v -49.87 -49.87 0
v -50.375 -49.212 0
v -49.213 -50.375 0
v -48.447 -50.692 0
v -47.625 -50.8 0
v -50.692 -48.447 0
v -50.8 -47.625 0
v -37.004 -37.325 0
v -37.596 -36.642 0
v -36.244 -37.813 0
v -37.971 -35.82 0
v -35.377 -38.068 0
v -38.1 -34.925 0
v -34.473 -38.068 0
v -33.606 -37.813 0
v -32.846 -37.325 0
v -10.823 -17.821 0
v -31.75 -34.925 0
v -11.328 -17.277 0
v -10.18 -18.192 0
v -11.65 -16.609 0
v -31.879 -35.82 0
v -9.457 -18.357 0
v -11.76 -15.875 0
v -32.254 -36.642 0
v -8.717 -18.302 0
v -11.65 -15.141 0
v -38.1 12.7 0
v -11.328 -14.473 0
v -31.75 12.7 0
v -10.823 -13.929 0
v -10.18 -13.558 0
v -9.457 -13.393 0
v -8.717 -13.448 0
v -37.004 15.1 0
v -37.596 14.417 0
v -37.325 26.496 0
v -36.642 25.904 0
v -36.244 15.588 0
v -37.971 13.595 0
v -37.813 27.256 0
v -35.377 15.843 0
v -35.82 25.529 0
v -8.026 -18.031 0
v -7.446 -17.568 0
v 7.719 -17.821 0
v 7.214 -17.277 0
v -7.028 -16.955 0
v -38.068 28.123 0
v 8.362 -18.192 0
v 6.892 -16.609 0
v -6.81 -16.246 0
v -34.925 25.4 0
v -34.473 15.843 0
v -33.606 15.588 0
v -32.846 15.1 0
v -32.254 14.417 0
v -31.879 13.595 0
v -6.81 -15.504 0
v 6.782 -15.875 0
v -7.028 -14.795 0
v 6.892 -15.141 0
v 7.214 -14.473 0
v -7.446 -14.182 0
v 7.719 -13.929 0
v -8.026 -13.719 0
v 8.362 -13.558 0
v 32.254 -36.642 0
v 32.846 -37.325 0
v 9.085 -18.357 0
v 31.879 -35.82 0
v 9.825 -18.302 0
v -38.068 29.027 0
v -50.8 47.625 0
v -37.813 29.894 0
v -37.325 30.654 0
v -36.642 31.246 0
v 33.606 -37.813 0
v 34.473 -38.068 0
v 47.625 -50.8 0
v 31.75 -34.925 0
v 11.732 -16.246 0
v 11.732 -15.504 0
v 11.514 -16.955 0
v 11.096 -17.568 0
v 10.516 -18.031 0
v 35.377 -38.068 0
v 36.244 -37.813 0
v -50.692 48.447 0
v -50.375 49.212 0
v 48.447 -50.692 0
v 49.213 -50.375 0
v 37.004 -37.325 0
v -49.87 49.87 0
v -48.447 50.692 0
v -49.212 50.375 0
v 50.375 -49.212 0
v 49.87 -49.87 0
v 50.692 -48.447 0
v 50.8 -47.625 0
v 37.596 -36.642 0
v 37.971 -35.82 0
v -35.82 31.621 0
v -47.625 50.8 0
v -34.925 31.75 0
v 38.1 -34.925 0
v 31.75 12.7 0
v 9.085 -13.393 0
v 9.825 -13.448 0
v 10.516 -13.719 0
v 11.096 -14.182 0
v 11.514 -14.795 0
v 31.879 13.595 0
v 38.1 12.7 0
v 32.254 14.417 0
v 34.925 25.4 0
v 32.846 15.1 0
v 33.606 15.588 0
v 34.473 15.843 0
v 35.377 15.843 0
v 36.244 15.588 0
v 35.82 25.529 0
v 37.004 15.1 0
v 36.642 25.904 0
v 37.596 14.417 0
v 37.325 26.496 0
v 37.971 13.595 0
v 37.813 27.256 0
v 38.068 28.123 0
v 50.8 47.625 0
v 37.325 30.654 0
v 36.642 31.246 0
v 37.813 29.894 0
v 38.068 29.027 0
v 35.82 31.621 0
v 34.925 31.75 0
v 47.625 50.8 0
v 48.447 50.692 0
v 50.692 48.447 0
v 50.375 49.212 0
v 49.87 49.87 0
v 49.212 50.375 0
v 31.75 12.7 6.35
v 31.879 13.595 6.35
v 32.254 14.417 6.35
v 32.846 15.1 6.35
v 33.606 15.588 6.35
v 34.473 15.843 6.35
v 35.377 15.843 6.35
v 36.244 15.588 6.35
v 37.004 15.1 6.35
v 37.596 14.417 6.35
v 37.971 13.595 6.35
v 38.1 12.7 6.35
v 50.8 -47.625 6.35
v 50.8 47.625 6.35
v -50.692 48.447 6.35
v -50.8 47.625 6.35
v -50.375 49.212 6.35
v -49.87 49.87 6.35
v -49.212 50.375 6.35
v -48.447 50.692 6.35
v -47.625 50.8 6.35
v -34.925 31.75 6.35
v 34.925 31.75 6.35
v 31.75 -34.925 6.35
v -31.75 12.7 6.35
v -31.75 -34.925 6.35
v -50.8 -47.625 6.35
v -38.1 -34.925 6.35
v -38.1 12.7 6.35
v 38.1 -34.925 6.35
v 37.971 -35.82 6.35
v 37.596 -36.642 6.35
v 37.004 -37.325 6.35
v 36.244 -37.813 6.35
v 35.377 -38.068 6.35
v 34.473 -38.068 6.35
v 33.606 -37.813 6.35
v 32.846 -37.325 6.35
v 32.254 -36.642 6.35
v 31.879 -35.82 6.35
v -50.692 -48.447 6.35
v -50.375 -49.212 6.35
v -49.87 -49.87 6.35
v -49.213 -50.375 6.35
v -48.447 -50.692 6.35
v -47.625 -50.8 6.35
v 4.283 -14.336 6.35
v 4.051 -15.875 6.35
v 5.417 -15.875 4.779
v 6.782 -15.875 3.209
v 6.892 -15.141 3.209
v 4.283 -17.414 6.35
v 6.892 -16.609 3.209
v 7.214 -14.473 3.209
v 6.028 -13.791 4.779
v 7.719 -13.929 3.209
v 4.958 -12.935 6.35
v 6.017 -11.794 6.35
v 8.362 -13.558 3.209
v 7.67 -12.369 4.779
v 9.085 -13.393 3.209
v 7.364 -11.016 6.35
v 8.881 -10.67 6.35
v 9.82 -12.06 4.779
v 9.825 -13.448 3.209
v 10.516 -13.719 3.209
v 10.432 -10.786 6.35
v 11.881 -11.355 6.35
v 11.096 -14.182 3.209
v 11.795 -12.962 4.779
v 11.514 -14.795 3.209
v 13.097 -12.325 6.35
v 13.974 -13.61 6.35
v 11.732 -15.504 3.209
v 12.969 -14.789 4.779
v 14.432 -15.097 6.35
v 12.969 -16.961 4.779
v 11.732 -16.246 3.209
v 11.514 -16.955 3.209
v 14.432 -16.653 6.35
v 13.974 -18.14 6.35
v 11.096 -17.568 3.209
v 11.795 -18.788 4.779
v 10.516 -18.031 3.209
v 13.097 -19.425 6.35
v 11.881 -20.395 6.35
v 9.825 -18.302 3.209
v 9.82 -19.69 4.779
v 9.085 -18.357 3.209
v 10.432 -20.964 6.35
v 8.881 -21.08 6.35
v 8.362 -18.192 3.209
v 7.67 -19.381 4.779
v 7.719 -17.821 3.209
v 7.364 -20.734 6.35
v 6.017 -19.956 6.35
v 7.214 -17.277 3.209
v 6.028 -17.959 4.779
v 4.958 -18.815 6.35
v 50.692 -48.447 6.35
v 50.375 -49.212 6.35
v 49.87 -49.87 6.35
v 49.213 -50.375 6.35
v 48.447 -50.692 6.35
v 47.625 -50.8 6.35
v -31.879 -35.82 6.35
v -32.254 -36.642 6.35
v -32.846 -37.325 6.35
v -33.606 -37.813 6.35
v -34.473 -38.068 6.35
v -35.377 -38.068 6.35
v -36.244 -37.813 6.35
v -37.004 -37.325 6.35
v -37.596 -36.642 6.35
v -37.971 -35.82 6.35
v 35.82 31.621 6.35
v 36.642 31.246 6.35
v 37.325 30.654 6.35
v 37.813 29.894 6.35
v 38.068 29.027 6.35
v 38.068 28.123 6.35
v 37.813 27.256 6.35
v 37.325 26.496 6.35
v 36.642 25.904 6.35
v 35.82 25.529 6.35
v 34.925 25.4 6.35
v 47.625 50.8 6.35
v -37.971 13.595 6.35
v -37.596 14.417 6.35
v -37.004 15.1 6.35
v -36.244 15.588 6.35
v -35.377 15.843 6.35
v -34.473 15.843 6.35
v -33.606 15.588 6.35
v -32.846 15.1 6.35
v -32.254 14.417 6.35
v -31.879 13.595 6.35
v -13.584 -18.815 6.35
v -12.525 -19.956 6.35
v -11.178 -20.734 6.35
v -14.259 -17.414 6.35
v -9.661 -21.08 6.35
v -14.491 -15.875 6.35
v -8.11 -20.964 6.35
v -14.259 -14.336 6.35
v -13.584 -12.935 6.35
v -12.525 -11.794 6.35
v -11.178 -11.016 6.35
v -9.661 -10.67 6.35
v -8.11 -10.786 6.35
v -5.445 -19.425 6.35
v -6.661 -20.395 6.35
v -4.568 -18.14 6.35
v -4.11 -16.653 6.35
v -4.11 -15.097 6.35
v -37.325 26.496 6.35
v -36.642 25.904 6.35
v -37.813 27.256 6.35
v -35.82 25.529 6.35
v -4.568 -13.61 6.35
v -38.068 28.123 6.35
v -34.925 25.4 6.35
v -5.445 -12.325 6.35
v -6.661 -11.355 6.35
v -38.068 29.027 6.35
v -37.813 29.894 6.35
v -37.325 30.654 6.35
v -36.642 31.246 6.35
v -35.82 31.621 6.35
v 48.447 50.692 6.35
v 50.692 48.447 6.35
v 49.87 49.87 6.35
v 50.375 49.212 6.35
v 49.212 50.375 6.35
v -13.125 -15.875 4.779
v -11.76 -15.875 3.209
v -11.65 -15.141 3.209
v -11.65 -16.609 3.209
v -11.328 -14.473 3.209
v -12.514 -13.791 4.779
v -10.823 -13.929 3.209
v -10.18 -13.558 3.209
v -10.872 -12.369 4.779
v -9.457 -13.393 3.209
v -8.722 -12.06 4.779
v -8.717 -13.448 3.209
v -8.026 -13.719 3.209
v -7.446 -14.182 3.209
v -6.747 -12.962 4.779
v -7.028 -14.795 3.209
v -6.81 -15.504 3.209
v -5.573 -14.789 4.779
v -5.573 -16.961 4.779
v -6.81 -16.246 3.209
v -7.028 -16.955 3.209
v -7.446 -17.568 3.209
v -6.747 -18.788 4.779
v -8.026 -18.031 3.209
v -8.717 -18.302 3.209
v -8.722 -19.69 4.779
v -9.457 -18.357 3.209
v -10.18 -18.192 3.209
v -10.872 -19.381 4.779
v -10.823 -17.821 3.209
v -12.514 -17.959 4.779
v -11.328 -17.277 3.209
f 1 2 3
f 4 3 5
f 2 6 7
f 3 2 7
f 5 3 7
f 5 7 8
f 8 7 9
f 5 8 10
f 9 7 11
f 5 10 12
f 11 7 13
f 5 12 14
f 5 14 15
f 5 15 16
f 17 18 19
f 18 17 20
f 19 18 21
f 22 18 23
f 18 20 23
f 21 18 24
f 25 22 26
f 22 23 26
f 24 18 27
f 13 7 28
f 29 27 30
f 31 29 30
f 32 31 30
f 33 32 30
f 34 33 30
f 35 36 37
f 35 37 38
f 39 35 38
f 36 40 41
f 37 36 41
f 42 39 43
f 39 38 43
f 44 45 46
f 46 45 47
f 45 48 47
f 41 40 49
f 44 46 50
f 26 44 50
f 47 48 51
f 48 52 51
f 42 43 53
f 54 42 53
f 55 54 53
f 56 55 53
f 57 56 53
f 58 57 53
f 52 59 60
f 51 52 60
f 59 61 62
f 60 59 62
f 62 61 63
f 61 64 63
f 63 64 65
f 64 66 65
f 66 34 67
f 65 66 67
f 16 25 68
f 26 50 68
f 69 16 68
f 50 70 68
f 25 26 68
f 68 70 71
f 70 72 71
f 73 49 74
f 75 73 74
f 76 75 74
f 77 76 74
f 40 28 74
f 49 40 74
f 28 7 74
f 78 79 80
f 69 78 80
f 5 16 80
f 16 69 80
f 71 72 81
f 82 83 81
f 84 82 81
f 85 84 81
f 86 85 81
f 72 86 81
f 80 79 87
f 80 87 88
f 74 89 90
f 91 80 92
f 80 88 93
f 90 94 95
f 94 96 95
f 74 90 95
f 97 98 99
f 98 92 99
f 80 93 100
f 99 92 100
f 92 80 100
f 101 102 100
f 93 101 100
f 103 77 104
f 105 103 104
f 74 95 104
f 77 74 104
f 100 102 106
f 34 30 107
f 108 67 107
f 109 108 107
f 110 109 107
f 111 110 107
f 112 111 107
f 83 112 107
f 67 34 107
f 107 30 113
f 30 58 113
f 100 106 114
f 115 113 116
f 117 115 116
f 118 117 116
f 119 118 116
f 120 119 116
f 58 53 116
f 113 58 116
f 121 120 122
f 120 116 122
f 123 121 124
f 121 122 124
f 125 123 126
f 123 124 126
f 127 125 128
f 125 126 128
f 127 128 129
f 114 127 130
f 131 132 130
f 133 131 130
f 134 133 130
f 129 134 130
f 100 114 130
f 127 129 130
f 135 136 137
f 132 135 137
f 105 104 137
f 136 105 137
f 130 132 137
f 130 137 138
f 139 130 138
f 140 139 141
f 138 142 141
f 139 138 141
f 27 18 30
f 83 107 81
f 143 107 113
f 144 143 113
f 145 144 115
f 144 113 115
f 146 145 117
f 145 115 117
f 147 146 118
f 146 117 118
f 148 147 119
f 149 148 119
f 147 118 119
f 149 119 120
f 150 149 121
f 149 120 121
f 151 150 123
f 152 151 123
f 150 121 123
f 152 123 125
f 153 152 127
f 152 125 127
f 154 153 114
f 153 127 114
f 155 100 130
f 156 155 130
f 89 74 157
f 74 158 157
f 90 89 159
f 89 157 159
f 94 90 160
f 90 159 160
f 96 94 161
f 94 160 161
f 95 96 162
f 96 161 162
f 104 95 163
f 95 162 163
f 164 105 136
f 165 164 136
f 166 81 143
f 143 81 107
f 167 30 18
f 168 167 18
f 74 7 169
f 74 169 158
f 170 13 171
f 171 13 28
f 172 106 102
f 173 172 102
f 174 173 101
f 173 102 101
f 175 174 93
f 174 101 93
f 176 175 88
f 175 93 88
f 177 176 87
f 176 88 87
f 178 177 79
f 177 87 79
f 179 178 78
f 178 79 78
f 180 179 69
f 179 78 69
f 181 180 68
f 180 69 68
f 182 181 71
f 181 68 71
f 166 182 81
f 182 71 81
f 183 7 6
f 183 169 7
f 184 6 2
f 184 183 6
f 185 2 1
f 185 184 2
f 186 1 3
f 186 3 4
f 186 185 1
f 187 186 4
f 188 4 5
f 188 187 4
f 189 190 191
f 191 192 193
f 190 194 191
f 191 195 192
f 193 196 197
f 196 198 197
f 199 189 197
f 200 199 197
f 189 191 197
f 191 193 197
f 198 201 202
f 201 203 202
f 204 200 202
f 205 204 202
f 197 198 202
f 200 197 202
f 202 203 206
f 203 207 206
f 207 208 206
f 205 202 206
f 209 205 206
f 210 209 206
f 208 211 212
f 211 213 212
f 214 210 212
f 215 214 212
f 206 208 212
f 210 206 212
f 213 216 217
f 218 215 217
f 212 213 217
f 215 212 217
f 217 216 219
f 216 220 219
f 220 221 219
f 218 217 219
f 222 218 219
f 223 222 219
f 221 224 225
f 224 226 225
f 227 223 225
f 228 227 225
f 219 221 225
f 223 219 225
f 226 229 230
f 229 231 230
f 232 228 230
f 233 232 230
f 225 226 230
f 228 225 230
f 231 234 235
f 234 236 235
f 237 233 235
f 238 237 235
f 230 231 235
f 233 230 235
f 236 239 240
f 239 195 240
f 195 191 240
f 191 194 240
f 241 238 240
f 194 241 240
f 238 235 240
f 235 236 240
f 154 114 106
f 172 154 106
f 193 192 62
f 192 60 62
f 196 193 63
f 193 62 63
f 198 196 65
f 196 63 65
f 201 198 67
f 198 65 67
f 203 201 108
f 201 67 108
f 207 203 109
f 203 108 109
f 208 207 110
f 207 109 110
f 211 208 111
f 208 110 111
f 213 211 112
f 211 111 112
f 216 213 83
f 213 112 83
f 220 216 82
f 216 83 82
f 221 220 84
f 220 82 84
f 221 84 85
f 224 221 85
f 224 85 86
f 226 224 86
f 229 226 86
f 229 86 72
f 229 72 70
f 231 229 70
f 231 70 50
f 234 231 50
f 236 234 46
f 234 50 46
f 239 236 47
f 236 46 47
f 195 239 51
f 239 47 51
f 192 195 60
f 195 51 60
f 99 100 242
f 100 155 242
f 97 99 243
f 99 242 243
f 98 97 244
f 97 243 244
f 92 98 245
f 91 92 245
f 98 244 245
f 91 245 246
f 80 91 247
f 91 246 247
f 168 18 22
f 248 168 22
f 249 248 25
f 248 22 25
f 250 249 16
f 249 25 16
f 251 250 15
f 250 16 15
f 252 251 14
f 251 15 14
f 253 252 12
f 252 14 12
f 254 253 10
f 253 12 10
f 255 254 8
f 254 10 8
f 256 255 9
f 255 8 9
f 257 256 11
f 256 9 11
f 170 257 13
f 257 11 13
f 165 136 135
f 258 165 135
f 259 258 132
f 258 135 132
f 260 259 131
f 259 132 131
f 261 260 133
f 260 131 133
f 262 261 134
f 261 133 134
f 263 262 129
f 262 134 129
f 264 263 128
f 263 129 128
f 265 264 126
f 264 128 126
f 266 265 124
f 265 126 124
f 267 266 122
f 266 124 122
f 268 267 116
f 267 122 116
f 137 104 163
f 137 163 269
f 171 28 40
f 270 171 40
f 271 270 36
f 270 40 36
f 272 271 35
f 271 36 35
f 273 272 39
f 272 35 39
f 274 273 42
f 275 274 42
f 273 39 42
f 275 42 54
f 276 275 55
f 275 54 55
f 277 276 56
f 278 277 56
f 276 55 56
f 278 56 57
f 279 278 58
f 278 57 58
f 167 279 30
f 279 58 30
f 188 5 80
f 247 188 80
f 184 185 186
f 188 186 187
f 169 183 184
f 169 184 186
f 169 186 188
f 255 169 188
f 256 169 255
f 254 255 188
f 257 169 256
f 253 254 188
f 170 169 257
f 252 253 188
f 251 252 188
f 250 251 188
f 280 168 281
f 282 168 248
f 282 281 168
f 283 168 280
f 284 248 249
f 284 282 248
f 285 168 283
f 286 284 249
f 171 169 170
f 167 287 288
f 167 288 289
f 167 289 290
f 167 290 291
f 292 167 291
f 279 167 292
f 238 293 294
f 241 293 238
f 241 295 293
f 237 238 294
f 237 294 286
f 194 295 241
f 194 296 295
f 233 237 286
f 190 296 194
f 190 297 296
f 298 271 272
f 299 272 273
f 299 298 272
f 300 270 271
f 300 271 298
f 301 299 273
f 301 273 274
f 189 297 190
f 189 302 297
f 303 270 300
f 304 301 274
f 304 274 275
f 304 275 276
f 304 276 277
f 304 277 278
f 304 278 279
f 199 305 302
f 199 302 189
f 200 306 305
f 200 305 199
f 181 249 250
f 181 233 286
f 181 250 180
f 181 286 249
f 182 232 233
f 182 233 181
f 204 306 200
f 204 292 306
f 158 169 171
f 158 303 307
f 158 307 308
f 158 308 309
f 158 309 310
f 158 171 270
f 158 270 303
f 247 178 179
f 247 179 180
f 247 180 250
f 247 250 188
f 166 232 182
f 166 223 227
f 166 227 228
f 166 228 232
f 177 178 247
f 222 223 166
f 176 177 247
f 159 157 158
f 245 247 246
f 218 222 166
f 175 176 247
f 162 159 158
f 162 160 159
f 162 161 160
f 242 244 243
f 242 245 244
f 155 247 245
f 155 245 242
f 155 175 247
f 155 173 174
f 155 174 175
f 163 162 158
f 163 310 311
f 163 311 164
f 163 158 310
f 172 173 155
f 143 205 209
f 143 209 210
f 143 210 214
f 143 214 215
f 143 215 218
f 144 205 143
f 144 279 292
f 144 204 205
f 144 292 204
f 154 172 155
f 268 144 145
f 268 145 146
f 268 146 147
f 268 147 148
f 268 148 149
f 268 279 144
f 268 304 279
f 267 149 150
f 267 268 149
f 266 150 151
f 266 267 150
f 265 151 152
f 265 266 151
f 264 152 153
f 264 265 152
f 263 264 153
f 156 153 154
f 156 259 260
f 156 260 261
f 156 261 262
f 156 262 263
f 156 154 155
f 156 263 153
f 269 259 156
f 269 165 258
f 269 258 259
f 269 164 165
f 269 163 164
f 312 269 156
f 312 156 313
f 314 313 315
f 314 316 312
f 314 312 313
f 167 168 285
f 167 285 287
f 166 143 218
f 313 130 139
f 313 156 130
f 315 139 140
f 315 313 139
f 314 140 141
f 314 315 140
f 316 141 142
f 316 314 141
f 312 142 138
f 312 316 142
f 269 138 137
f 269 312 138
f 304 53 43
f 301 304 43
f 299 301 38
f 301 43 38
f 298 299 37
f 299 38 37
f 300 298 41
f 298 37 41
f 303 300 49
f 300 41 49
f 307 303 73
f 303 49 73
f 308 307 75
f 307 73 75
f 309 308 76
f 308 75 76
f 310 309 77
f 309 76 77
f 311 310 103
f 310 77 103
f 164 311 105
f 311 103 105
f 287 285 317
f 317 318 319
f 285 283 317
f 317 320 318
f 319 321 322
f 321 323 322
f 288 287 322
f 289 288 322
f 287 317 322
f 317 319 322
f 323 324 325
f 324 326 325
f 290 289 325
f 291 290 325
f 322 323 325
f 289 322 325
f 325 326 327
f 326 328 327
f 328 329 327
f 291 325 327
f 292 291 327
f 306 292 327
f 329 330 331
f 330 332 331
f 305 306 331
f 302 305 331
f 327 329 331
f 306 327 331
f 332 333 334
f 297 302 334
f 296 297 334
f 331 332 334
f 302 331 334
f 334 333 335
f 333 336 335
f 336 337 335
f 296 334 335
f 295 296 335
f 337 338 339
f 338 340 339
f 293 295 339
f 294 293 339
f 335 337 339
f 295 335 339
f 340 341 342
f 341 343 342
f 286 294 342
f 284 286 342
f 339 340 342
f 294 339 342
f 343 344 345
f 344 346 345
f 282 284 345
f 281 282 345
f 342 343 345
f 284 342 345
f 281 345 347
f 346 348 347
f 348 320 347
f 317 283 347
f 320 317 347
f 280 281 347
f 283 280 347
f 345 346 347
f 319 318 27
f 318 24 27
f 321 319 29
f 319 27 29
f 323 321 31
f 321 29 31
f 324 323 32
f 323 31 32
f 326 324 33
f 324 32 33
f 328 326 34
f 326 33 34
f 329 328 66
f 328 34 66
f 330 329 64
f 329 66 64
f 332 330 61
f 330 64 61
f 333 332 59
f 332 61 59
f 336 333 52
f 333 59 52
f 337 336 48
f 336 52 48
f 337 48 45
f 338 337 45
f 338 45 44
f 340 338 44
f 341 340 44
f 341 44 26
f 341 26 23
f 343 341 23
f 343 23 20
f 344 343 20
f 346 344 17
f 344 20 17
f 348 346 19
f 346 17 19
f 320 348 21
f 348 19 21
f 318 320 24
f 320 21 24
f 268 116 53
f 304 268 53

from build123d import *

# Parameters (mm, degrees)
F0_W           = 101.6
F0_H           = 101.6
F1_DEPTH       = 6.35
F3_D           = 4.9784
F3_CSINK_D     = 10.4394
F3_CSINK_ANGLE = 82
F4_R           = 3.175


with BuildPart() as f1:
    # F0 (on Top) → F1 (new body)
    with BuildSketch(Plane.XY):
        Rectangle(F0_W, F0_H)
        with BuildLine():
            Line((-38.1, -34.925), (-38.1, 12.7))
            ThreePointArc((-38.1, 12.7), (-34.925, 15.875), (-31.75, 12.7))
            Line((-31.75, 12.7), (-31.75, -34.925))
            ThreePointArc((-31.75, -34.925), (-34.925, -38.1), (-38.1, -34.925))
        make_face(mode=Mode.SUBTRACT)
        with BuildLine():
            Line((31.75, -34.925), (31.75, 12.7))
            ThreePointArc((31.75, 12.7), (34.925, 15.875), (38.1, 12.7))
            Line((38.1, 12.7), (38.1, -34.925))
            ThreePointArc((38.1, -34.925), (34.925, -38.1), (31.75, -34.925))
        make_face(mode=Mode.SUBTRACT)
        with BuildLine():
            Line((34.925, 25.4), (-34.925, 25.4))
            ThreePointArc((-34.925, 25.4), (-38.1, 28.575), (-34.925, 31.75))
            Line((-34.925, 31.75), (34.925, 31.75))
            ThreePointArc((34.925, 31.75), (38.1, 28.575), (34.925, 25.4))
        make_face(mode=Mode.SUBTRACT)
    extrude(amount=F1_DEPTH)

    # F3 (through all)
    with Locations(Plane.XY.offset(6.35)):
        with Locations((-9.271, -15.875), (9.271, -15.875)):
            CounterSinkHole(F3_D / 2, F3_CSINK_D / 2, counter_sink_angle=F3_CSINK_ANGLE)

    # F4
    f4_edges = [f1.edges().sort_by_distance(p)[0] for p in [
        (-50.8, -50.8, 3.175),
        (50.8, -50.8, 3.175),
        (-50.8, 50.8, 3.175),
        (50.8, 50.8, 3.175),
    ]]
    fillet(f4_edges, radius=F4_R)


solid = f1.part
